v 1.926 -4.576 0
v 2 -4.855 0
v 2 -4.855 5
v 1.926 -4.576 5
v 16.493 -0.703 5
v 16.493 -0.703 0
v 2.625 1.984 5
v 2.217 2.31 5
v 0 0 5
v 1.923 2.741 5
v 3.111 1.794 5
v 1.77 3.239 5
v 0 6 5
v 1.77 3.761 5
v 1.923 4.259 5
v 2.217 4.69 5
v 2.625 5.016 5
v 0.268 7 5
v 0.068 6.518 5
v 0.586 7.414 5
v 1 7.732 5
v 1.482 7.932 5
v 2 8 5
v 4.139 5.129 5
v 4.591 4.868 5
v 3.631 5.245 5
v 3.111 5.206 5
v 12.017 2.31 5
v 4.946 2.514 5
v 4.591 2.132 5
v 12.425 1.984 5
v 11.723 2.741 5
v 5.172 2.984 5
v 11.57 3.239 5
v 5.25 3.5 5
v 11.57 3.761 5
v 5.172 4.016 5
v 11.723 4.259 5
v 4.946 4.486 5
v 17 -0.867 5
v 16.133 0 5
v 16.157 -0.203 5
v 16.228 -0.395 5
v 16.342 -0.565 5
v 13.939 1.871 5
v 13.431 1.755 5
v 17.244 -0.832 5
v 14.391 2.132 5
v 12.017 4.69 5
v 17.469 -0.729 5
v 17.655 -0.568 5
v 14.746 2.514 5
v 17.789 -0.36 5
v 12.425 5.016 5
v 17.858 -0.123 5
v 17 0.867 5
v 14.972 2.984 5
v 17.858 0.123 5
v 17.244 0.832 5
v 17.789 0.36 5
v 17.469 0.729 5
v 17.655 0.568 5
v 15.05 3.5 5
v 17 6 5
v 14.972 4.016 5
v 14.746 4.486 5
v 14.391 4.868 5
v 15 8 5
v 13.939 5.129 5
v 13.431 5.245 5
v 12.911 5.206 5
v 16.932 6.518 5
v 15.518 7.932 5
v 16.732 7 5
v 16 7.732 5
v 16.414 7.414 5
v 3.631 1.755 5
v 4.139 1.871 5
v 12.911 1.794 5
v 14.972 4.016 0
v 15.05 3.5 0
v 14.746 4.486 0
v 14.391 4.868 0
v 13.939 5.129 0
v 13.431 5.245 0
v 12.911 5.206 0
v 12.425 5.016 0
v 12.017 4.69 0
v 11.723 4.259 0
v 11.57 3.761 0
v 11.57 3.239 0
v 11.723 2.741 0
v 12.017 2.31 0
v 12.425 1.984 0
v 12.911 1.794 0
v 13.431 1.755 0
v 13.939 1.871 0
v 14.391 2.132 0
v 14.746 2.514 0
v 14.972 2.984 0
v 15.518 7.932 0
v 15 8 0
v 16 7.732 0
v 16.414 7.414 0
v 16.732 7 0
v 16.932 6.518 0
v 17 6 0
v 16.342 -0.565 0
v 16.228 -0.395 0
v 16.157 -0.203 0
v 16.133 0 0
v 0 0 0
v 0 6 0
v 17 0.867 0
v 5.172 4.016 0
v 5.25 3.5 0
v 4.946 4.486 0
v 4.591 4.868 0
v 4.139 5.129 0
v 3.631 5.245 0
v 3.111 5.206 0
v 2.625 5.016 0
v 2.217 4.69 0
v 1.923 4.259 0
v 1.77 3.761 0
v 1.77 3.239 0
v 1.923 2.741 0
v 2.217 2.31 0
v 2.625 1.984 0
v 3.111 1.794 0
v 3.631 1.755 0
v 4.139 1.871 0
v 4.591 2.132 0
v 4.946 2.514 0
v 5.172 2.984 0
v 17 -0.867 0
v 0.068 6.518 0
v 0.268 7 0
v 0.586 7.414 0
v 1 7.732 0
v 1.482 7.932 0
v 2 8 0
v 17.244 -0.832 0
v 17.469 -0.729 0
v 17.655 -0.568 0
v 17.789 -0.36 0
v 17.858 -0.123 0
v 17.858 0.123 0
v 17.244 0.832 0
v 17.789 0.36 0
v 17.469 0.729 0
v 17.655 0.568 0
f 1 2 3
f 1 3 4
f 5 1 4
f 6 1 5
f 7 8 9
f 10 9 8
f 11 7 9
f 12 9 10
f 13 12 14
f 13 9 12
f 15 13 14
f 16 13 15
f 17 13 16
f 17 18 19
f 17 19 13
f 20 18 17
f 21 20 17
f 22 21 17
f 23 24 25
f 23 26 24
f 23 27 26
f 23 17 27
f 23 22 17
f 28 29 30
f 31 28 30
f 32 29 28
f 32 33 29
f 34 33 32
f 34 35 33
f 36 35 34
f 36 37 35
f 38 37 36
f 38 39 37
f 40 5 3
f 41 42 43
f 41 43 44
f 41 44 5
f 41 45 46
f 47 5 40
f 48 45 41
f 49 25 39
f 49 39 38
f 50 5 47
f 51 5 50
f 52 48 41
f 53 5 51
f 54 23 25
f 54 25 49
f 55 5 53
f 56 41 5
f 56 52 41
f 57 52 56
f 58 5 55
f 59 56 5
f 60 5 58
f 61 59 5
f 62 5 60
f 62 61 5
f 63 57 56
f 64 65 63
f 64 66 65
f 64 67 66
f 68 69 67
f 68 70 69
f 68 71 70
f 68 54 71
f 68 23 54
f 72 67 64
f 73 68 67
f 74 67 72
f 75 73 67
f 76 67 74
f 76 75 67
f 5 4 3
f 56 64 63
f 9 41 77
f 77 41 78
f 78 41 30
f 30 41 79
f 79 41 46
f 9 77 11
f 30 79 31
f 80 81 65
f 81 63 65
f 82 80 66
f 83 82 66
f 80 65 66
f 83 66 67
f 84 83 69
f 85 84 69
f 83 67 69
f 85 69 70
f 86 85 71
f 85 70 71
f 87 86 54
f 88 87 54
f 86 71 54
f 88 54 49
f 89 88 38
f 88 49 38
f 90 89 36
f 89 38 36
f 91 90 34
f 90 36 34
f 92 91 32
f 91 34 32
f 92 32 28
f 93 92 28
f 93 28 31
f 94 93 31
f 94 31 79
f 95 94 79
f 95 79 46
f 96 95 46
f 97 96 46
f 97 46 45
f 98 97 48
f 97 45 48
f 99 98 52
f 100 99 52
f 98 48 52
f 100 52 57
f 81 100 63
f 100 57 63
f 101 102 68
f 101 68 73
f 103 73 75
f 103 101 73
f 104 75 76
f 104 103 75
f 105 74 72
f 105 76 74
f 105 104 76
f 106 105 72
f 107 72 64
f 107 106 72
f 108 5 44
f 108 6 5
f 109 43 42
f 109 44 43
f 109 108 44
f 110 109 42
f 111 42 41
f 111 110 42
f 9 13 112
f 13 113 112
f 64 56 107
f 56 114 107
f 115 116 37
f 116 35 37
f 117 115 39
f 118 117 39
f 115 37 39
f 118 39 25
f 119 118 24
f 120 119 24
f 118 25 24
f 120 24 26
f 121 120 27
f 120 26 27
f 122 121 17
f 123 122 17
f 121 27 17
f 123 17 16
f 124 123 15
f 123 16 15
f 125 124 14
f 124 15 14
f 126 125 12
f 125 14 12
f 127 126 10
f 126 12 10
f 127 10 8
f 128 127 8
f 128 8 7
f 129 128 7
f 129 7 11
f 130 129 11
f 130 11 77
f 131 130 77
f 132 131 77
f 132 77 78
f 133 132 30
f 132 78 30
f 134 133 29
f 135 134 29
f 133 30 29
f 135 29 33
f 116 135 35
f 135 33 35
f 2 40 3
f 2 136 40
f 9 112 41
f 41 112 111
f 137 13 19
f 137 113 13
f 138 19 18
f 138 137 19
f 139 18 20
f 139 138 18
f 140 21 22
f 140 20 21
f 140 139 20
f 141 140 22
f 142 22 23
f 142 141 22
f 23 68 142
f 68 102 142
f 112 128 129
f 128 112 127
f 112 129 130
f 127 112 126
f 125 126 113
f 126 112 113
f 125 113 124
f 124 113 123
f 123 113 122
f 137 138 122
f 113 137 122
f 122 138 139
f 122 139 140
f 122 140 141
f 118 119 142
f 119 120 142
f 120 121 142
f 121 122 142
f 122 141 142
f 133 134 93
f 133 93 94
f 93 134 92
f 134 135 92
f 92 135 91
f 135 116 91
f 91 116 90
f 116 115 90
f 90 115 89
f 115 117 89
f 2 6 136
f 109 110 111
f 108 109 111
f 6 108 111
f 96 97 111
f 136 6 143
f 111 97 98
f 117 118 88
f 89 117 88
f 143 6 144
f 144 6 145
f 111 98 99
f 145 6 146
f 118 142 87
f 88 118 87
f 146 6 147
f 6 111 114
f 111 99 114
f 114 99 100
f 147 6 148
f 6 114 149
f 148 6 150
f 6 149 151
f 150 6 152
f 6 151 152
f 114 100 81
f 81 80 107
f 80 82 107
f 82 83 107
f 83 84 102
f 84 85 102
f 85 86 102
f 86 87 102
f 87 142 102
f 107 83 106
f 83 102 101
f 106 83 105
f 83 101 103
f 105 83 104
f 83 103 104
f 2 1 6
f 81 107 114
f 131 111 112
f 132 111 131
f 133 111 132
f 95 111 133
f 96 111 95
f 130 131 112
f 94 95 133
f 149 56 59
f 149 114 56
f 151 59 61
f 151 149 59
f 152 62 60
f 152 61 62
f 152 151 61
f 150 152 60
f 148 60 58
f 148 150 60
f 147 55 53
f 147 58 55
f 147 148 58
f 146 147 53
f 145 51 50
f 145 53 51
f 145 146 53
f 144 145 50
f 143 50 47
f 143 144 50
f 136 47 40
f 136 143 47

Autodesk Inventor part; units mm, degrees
ref_plane "YZ Plane" through (0, 0, 0) normal (1, 0, 0) x (0, 1, 0)
ref_plane "XZ Plane" through (0, 0, 0) normal (0, 1, 0) x (-1, 0, 0)
ref_plane "XY Plane" through (0, 0, 0) normal (0, 0, 1) x (1, 0, 0)
sketch "Sketch1" plane through (0, 0, 0) normal (0, 0, 1) x (1, 0, 0)
  line L0 (0, 0) -> (17, 0)
  line L1 (17, 0.8671) -> (17, 6)
  line L2 (15, 8) -> (2, 8)
  line L3 (0, 6) -> (0, 0)
  line L4 (17, -0.8671) -> (2, -4.8546)
  line L5 (2, -4.8546) -> (1.9259, -4.5758)
  line L6 (1.9259, -4.5758) -> (16.4929, -0.7033)
  arc A0 (17, -0.8671) -> (17, 0.8671) centre (17, 0) ccw
  arc A1 (16.1329, 0) -> (16.4929, -0.7033) centre (17, 0) ccw
  arc A2 (2, 8) -> (0, 6) centre (2, 6) ccw
  arc A3 (17, 6) -> (15, 8) centre (15, 6) ccw
  point P0 (17, 8)
  point P1 (0, 8)
  dimension "d0" = 17
  dimension "d1" = 8
  dimension "d9" = 2
extrude "Extrusion1" add sketch "Sketch1" along normal blind 5
sketch "Sketch2" plane through (0, 0, 5) normal (0, 0, 1) x (1, 0, 0)
  circle A0 centre (3.5, 3.5) radius 1.75
  circle A1 centre (13.3, 3.5) radius 1.75
  line L0 (0, 0) -> (16.1329, 0) projected
  line L1 (0, 6) -> (0, 0) projected
  dimension "d4" = 3.5
  dimension "d5" = 3.5
  dimension "d6" = 9.8
  dimension "d10" = 3.5
  dimension "d11" = 3.5
  dimension "d12" = 3.5
extrude "Extrusion2" cut sketch "Sketch2" against normal blind 5
equation "\"BendRadius\" = Thickness"
equation "\"BendReliefWidth\" = Thickness"
equation "\"BendReliefDepth\" = 0.5 * Thickness"
equation "\"CornerReliefSize\" = 4 * Thickness"
equation "\"MinimumRemnant\" = 2 * Thickness"
equation "\"TransitionRadius\" = BendRadius"
equation "\"JacobiRadiusSize\" = BendRadius"
equation "\"GapSize\" = Thickness"
equation "\"Thickness\" = 0.5"
properties part number "công tắc hành trình"
